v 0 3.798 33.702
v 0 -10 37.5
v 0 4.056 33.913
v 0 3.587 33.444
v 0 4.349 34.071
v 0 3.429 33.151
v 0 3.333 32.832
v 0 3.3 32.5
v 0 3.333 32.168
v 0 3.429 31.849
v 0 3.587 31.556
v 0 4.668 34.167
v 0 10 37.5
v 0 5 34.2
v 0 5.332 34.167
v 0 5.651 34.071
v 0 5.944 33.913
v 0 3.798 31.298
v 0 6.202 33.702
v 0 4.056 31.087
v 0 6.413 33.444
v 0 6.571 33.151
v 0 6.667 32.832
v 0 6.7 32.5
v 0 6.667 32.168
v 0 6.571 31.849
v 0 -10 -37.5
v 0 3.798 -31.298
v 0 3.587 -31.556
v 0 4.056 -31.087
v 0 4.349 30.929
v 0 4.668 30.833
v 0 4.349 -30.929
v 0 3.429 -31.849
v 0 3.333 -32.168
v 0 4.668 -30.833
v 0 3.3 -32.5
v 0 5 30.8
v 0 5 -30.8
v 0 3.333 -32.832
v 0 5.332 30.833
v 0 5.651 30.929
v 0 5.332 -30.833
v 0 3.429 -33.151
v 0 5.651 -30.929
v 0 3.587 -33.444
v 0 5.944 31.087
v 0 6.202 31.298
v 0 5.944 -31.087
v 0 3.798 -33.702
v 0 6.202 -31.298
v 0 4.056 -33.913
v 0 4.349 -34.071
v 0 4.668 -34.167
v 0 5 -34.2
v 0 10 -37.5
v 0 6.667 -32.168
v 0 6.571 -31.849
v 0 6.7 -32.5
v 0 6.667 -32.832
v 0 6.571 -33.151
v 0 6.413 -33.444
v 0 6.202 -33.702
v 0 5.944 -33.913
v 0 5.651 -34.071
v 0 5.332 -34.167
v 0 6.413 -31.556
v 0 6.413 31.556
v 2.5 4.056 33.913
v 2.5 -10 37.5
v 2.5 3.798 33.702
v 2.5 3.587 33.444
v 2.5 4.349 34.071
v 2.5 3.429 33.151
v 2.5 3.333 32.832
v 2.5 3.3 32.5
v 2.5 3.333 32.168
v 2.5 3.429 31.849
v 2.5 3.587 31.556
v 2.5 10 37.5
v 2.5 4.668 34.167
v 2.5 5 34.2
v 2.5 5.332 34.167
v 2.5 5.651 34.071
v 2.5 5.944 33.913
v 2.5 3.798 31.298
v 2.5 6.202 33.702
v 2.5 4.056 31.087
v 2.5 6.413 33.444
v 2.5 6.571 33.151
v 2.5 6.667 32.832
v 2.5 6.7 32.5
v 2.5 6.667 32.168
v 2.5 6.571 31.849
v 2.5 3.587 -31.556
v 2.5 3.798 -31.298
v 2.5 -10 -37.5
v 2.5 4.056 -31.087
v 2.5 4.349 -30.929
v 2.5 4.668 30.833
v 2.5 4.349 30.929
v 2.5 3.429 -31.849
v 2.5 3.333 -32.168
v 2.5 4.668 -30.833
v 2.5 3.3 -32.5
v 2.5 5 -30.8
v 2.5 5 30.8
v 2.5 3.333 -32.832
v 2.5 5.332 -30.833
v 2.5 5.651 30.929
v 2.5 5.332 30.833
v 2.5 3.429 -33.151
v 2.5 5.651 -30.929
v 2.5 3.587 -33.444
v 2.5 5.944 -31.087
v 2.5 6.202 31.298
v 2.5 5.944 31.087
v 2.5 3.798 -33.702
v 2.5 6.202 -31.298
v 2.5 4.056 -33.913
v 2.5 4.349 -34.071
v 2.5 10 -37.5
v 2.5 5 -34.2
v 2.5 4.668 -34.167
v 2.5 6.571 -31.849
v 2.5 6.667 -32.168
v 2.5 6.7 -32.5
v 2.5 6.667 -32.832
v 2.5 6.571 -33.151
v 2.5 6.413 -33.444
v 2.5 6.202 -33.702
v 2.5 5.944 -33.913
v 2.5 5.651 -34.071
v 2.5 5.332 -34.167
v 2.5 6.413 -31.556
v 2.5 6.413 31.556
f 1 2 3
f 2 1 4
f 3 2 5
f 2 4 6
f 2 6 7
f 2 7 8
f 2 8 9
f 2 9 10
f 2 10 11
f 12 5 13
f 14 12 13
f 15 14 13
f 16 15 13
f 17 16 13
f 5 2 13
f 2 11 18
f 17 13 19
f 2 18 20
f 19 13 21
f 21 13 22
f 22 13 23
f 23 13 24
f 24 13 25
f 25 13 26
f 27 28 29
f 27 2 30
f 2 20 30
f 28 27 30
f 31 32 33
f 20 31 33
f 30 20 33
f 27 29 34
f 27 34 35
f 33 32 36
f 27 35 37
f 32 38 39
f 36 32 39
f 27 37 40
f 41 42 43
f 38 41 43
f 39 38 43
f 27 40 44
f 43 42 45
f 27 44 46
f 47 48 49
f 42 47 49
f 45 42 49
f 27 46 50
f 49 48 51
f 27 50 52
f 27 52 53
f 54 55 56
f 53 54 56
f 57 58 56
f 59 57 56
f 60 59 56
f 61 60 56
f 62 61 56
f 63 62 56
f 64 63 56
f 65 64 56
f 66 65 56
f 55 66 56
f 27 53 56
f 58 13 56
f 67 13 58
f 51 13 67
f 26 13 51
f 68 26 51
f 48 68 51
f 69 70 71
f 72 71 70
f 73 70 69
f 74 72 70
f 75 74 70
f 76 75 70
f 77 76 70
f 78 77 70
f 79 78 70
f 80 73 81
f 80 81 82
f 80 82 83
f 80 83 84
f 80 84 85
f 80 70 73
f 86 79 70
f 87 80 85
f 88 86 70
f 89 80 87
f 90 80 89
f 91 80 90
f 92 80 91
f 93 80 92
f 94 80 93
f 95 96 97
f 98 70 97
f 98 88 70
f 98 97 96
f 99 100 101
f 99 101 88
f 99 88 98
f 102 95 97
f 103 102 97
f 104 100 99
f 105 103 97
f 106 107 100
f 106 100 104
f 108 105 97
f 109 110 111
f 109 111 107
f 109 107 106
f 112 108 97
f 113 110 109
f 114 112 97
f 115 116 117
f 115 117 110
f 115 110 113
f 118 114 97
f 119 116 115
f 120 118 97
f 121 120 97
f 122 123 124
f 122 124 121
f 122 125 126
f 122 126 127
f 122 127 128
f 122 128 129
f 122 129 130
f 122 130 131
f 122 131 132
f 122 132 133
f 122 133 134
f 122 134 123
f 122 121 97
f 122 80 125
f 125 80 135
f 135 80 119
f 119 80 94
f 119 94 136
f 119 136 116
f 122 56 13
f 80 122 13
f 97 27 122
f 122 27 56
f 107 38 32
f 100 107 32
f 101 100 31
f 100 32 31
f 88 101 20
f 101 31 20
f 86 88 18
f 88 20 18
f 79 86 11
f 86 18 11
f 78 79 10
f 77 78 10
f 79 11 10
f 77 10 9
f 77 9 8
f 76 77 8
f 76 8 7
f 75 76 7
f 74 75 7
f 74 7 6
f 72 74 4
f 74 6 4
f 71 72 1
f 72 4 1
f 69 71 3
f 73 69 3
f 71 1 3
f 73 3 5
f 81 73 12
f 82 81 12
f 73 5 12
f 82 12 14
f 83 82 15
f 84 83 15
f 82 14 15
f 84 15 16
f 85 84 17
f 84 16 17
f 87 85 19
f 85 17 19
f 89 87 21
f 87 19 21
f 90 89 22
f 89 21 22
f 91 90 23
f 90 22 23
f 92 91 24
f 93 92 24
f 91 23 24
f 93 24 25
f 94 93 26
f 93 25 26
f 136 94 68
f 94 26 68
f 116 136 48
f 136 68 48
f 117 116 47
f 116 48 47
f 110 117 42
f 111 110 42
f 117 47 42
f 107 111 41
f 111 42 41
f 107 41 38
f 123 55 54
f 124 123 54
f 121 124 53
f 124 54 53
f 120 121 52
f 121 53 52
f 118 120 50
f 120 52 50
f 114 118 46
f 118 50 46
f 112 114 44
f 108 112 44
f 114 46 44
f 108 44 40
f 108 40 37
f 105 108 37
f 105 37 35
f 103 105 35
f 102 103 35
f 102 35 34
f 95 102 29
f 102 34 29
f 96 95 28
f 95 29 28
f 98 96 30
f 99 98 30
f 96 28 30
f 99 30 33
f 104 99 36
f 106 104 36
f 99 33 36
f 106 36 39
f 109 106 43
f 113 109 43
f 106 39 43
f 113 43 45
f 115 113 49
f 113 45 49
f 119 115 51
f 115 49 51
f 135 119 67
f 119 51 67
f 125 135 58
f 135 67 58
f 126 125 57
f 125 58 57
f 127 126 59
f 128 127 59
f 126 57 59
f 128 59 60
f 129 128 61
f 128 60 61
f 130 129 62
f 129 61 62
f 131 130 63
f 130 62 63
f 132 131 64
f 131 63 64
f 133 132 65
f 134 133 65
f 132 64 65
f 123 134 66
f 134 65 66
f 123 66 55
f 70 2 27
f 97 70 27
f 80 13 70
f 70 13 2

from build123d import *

# Parameters (mm, degrees)
SKETCH1_W           = 75
SKETCH1_H           = 10
BOSS_EXTRUDE1_DEPTH = 2.5


with BuildPart() as part:
    # Sketch1 → Boss-Extrude1 (new body)
    with BuildSketch(Plane(origin=(0, 0, 0), x_dir=(0, 0, -1), z_dir=(1, 0, 0))):
        with BuildLine():
            Line((34.2, 5), (37.5, 5))
            Line((37.5, 5), (37.5, 10))
            Line((37.5, 10), (-37.5, 10))
            Line((-37.5, 10), (-37.5, 5))
            Line((-37.5, 5), (-34.2, 5))
            ThreePointArc((-34.2, 5), (-32.5, 6.7), (-30.8, 5))
            Line((-30.8, 5), (30.8, 5))
            ThreePointArc((30.8, 5), (32.5, 6.7), (34.2, 5))
        make_face()
        with BuildLine():
            Line((-37.5, 0), (37.5, 0))
            Line((37.5, 0), (37.5, 5))
            Line((37.5, 5), (34.2, 5))
            ThreePointArc((34.2, 5), (32.5, 3.3), (30.8, 5))
            Line((30.8, 5), (-30.8, 5))
            ThreePointArc((-30.8, 5), (-32.5, 3.3), (-34.2, 5))
            Line((-34.2, 5), (-37.5, 5))
            Line((-37.5, 5), (-37.5, 0))
        make_face()
        with Locations((0, -5)):
            Rectangle(SKETCH1_W, SKETCH1_H)
    extrude(amount=BOSS_EXTRUDE1_DEPTH)


solid = part.part
